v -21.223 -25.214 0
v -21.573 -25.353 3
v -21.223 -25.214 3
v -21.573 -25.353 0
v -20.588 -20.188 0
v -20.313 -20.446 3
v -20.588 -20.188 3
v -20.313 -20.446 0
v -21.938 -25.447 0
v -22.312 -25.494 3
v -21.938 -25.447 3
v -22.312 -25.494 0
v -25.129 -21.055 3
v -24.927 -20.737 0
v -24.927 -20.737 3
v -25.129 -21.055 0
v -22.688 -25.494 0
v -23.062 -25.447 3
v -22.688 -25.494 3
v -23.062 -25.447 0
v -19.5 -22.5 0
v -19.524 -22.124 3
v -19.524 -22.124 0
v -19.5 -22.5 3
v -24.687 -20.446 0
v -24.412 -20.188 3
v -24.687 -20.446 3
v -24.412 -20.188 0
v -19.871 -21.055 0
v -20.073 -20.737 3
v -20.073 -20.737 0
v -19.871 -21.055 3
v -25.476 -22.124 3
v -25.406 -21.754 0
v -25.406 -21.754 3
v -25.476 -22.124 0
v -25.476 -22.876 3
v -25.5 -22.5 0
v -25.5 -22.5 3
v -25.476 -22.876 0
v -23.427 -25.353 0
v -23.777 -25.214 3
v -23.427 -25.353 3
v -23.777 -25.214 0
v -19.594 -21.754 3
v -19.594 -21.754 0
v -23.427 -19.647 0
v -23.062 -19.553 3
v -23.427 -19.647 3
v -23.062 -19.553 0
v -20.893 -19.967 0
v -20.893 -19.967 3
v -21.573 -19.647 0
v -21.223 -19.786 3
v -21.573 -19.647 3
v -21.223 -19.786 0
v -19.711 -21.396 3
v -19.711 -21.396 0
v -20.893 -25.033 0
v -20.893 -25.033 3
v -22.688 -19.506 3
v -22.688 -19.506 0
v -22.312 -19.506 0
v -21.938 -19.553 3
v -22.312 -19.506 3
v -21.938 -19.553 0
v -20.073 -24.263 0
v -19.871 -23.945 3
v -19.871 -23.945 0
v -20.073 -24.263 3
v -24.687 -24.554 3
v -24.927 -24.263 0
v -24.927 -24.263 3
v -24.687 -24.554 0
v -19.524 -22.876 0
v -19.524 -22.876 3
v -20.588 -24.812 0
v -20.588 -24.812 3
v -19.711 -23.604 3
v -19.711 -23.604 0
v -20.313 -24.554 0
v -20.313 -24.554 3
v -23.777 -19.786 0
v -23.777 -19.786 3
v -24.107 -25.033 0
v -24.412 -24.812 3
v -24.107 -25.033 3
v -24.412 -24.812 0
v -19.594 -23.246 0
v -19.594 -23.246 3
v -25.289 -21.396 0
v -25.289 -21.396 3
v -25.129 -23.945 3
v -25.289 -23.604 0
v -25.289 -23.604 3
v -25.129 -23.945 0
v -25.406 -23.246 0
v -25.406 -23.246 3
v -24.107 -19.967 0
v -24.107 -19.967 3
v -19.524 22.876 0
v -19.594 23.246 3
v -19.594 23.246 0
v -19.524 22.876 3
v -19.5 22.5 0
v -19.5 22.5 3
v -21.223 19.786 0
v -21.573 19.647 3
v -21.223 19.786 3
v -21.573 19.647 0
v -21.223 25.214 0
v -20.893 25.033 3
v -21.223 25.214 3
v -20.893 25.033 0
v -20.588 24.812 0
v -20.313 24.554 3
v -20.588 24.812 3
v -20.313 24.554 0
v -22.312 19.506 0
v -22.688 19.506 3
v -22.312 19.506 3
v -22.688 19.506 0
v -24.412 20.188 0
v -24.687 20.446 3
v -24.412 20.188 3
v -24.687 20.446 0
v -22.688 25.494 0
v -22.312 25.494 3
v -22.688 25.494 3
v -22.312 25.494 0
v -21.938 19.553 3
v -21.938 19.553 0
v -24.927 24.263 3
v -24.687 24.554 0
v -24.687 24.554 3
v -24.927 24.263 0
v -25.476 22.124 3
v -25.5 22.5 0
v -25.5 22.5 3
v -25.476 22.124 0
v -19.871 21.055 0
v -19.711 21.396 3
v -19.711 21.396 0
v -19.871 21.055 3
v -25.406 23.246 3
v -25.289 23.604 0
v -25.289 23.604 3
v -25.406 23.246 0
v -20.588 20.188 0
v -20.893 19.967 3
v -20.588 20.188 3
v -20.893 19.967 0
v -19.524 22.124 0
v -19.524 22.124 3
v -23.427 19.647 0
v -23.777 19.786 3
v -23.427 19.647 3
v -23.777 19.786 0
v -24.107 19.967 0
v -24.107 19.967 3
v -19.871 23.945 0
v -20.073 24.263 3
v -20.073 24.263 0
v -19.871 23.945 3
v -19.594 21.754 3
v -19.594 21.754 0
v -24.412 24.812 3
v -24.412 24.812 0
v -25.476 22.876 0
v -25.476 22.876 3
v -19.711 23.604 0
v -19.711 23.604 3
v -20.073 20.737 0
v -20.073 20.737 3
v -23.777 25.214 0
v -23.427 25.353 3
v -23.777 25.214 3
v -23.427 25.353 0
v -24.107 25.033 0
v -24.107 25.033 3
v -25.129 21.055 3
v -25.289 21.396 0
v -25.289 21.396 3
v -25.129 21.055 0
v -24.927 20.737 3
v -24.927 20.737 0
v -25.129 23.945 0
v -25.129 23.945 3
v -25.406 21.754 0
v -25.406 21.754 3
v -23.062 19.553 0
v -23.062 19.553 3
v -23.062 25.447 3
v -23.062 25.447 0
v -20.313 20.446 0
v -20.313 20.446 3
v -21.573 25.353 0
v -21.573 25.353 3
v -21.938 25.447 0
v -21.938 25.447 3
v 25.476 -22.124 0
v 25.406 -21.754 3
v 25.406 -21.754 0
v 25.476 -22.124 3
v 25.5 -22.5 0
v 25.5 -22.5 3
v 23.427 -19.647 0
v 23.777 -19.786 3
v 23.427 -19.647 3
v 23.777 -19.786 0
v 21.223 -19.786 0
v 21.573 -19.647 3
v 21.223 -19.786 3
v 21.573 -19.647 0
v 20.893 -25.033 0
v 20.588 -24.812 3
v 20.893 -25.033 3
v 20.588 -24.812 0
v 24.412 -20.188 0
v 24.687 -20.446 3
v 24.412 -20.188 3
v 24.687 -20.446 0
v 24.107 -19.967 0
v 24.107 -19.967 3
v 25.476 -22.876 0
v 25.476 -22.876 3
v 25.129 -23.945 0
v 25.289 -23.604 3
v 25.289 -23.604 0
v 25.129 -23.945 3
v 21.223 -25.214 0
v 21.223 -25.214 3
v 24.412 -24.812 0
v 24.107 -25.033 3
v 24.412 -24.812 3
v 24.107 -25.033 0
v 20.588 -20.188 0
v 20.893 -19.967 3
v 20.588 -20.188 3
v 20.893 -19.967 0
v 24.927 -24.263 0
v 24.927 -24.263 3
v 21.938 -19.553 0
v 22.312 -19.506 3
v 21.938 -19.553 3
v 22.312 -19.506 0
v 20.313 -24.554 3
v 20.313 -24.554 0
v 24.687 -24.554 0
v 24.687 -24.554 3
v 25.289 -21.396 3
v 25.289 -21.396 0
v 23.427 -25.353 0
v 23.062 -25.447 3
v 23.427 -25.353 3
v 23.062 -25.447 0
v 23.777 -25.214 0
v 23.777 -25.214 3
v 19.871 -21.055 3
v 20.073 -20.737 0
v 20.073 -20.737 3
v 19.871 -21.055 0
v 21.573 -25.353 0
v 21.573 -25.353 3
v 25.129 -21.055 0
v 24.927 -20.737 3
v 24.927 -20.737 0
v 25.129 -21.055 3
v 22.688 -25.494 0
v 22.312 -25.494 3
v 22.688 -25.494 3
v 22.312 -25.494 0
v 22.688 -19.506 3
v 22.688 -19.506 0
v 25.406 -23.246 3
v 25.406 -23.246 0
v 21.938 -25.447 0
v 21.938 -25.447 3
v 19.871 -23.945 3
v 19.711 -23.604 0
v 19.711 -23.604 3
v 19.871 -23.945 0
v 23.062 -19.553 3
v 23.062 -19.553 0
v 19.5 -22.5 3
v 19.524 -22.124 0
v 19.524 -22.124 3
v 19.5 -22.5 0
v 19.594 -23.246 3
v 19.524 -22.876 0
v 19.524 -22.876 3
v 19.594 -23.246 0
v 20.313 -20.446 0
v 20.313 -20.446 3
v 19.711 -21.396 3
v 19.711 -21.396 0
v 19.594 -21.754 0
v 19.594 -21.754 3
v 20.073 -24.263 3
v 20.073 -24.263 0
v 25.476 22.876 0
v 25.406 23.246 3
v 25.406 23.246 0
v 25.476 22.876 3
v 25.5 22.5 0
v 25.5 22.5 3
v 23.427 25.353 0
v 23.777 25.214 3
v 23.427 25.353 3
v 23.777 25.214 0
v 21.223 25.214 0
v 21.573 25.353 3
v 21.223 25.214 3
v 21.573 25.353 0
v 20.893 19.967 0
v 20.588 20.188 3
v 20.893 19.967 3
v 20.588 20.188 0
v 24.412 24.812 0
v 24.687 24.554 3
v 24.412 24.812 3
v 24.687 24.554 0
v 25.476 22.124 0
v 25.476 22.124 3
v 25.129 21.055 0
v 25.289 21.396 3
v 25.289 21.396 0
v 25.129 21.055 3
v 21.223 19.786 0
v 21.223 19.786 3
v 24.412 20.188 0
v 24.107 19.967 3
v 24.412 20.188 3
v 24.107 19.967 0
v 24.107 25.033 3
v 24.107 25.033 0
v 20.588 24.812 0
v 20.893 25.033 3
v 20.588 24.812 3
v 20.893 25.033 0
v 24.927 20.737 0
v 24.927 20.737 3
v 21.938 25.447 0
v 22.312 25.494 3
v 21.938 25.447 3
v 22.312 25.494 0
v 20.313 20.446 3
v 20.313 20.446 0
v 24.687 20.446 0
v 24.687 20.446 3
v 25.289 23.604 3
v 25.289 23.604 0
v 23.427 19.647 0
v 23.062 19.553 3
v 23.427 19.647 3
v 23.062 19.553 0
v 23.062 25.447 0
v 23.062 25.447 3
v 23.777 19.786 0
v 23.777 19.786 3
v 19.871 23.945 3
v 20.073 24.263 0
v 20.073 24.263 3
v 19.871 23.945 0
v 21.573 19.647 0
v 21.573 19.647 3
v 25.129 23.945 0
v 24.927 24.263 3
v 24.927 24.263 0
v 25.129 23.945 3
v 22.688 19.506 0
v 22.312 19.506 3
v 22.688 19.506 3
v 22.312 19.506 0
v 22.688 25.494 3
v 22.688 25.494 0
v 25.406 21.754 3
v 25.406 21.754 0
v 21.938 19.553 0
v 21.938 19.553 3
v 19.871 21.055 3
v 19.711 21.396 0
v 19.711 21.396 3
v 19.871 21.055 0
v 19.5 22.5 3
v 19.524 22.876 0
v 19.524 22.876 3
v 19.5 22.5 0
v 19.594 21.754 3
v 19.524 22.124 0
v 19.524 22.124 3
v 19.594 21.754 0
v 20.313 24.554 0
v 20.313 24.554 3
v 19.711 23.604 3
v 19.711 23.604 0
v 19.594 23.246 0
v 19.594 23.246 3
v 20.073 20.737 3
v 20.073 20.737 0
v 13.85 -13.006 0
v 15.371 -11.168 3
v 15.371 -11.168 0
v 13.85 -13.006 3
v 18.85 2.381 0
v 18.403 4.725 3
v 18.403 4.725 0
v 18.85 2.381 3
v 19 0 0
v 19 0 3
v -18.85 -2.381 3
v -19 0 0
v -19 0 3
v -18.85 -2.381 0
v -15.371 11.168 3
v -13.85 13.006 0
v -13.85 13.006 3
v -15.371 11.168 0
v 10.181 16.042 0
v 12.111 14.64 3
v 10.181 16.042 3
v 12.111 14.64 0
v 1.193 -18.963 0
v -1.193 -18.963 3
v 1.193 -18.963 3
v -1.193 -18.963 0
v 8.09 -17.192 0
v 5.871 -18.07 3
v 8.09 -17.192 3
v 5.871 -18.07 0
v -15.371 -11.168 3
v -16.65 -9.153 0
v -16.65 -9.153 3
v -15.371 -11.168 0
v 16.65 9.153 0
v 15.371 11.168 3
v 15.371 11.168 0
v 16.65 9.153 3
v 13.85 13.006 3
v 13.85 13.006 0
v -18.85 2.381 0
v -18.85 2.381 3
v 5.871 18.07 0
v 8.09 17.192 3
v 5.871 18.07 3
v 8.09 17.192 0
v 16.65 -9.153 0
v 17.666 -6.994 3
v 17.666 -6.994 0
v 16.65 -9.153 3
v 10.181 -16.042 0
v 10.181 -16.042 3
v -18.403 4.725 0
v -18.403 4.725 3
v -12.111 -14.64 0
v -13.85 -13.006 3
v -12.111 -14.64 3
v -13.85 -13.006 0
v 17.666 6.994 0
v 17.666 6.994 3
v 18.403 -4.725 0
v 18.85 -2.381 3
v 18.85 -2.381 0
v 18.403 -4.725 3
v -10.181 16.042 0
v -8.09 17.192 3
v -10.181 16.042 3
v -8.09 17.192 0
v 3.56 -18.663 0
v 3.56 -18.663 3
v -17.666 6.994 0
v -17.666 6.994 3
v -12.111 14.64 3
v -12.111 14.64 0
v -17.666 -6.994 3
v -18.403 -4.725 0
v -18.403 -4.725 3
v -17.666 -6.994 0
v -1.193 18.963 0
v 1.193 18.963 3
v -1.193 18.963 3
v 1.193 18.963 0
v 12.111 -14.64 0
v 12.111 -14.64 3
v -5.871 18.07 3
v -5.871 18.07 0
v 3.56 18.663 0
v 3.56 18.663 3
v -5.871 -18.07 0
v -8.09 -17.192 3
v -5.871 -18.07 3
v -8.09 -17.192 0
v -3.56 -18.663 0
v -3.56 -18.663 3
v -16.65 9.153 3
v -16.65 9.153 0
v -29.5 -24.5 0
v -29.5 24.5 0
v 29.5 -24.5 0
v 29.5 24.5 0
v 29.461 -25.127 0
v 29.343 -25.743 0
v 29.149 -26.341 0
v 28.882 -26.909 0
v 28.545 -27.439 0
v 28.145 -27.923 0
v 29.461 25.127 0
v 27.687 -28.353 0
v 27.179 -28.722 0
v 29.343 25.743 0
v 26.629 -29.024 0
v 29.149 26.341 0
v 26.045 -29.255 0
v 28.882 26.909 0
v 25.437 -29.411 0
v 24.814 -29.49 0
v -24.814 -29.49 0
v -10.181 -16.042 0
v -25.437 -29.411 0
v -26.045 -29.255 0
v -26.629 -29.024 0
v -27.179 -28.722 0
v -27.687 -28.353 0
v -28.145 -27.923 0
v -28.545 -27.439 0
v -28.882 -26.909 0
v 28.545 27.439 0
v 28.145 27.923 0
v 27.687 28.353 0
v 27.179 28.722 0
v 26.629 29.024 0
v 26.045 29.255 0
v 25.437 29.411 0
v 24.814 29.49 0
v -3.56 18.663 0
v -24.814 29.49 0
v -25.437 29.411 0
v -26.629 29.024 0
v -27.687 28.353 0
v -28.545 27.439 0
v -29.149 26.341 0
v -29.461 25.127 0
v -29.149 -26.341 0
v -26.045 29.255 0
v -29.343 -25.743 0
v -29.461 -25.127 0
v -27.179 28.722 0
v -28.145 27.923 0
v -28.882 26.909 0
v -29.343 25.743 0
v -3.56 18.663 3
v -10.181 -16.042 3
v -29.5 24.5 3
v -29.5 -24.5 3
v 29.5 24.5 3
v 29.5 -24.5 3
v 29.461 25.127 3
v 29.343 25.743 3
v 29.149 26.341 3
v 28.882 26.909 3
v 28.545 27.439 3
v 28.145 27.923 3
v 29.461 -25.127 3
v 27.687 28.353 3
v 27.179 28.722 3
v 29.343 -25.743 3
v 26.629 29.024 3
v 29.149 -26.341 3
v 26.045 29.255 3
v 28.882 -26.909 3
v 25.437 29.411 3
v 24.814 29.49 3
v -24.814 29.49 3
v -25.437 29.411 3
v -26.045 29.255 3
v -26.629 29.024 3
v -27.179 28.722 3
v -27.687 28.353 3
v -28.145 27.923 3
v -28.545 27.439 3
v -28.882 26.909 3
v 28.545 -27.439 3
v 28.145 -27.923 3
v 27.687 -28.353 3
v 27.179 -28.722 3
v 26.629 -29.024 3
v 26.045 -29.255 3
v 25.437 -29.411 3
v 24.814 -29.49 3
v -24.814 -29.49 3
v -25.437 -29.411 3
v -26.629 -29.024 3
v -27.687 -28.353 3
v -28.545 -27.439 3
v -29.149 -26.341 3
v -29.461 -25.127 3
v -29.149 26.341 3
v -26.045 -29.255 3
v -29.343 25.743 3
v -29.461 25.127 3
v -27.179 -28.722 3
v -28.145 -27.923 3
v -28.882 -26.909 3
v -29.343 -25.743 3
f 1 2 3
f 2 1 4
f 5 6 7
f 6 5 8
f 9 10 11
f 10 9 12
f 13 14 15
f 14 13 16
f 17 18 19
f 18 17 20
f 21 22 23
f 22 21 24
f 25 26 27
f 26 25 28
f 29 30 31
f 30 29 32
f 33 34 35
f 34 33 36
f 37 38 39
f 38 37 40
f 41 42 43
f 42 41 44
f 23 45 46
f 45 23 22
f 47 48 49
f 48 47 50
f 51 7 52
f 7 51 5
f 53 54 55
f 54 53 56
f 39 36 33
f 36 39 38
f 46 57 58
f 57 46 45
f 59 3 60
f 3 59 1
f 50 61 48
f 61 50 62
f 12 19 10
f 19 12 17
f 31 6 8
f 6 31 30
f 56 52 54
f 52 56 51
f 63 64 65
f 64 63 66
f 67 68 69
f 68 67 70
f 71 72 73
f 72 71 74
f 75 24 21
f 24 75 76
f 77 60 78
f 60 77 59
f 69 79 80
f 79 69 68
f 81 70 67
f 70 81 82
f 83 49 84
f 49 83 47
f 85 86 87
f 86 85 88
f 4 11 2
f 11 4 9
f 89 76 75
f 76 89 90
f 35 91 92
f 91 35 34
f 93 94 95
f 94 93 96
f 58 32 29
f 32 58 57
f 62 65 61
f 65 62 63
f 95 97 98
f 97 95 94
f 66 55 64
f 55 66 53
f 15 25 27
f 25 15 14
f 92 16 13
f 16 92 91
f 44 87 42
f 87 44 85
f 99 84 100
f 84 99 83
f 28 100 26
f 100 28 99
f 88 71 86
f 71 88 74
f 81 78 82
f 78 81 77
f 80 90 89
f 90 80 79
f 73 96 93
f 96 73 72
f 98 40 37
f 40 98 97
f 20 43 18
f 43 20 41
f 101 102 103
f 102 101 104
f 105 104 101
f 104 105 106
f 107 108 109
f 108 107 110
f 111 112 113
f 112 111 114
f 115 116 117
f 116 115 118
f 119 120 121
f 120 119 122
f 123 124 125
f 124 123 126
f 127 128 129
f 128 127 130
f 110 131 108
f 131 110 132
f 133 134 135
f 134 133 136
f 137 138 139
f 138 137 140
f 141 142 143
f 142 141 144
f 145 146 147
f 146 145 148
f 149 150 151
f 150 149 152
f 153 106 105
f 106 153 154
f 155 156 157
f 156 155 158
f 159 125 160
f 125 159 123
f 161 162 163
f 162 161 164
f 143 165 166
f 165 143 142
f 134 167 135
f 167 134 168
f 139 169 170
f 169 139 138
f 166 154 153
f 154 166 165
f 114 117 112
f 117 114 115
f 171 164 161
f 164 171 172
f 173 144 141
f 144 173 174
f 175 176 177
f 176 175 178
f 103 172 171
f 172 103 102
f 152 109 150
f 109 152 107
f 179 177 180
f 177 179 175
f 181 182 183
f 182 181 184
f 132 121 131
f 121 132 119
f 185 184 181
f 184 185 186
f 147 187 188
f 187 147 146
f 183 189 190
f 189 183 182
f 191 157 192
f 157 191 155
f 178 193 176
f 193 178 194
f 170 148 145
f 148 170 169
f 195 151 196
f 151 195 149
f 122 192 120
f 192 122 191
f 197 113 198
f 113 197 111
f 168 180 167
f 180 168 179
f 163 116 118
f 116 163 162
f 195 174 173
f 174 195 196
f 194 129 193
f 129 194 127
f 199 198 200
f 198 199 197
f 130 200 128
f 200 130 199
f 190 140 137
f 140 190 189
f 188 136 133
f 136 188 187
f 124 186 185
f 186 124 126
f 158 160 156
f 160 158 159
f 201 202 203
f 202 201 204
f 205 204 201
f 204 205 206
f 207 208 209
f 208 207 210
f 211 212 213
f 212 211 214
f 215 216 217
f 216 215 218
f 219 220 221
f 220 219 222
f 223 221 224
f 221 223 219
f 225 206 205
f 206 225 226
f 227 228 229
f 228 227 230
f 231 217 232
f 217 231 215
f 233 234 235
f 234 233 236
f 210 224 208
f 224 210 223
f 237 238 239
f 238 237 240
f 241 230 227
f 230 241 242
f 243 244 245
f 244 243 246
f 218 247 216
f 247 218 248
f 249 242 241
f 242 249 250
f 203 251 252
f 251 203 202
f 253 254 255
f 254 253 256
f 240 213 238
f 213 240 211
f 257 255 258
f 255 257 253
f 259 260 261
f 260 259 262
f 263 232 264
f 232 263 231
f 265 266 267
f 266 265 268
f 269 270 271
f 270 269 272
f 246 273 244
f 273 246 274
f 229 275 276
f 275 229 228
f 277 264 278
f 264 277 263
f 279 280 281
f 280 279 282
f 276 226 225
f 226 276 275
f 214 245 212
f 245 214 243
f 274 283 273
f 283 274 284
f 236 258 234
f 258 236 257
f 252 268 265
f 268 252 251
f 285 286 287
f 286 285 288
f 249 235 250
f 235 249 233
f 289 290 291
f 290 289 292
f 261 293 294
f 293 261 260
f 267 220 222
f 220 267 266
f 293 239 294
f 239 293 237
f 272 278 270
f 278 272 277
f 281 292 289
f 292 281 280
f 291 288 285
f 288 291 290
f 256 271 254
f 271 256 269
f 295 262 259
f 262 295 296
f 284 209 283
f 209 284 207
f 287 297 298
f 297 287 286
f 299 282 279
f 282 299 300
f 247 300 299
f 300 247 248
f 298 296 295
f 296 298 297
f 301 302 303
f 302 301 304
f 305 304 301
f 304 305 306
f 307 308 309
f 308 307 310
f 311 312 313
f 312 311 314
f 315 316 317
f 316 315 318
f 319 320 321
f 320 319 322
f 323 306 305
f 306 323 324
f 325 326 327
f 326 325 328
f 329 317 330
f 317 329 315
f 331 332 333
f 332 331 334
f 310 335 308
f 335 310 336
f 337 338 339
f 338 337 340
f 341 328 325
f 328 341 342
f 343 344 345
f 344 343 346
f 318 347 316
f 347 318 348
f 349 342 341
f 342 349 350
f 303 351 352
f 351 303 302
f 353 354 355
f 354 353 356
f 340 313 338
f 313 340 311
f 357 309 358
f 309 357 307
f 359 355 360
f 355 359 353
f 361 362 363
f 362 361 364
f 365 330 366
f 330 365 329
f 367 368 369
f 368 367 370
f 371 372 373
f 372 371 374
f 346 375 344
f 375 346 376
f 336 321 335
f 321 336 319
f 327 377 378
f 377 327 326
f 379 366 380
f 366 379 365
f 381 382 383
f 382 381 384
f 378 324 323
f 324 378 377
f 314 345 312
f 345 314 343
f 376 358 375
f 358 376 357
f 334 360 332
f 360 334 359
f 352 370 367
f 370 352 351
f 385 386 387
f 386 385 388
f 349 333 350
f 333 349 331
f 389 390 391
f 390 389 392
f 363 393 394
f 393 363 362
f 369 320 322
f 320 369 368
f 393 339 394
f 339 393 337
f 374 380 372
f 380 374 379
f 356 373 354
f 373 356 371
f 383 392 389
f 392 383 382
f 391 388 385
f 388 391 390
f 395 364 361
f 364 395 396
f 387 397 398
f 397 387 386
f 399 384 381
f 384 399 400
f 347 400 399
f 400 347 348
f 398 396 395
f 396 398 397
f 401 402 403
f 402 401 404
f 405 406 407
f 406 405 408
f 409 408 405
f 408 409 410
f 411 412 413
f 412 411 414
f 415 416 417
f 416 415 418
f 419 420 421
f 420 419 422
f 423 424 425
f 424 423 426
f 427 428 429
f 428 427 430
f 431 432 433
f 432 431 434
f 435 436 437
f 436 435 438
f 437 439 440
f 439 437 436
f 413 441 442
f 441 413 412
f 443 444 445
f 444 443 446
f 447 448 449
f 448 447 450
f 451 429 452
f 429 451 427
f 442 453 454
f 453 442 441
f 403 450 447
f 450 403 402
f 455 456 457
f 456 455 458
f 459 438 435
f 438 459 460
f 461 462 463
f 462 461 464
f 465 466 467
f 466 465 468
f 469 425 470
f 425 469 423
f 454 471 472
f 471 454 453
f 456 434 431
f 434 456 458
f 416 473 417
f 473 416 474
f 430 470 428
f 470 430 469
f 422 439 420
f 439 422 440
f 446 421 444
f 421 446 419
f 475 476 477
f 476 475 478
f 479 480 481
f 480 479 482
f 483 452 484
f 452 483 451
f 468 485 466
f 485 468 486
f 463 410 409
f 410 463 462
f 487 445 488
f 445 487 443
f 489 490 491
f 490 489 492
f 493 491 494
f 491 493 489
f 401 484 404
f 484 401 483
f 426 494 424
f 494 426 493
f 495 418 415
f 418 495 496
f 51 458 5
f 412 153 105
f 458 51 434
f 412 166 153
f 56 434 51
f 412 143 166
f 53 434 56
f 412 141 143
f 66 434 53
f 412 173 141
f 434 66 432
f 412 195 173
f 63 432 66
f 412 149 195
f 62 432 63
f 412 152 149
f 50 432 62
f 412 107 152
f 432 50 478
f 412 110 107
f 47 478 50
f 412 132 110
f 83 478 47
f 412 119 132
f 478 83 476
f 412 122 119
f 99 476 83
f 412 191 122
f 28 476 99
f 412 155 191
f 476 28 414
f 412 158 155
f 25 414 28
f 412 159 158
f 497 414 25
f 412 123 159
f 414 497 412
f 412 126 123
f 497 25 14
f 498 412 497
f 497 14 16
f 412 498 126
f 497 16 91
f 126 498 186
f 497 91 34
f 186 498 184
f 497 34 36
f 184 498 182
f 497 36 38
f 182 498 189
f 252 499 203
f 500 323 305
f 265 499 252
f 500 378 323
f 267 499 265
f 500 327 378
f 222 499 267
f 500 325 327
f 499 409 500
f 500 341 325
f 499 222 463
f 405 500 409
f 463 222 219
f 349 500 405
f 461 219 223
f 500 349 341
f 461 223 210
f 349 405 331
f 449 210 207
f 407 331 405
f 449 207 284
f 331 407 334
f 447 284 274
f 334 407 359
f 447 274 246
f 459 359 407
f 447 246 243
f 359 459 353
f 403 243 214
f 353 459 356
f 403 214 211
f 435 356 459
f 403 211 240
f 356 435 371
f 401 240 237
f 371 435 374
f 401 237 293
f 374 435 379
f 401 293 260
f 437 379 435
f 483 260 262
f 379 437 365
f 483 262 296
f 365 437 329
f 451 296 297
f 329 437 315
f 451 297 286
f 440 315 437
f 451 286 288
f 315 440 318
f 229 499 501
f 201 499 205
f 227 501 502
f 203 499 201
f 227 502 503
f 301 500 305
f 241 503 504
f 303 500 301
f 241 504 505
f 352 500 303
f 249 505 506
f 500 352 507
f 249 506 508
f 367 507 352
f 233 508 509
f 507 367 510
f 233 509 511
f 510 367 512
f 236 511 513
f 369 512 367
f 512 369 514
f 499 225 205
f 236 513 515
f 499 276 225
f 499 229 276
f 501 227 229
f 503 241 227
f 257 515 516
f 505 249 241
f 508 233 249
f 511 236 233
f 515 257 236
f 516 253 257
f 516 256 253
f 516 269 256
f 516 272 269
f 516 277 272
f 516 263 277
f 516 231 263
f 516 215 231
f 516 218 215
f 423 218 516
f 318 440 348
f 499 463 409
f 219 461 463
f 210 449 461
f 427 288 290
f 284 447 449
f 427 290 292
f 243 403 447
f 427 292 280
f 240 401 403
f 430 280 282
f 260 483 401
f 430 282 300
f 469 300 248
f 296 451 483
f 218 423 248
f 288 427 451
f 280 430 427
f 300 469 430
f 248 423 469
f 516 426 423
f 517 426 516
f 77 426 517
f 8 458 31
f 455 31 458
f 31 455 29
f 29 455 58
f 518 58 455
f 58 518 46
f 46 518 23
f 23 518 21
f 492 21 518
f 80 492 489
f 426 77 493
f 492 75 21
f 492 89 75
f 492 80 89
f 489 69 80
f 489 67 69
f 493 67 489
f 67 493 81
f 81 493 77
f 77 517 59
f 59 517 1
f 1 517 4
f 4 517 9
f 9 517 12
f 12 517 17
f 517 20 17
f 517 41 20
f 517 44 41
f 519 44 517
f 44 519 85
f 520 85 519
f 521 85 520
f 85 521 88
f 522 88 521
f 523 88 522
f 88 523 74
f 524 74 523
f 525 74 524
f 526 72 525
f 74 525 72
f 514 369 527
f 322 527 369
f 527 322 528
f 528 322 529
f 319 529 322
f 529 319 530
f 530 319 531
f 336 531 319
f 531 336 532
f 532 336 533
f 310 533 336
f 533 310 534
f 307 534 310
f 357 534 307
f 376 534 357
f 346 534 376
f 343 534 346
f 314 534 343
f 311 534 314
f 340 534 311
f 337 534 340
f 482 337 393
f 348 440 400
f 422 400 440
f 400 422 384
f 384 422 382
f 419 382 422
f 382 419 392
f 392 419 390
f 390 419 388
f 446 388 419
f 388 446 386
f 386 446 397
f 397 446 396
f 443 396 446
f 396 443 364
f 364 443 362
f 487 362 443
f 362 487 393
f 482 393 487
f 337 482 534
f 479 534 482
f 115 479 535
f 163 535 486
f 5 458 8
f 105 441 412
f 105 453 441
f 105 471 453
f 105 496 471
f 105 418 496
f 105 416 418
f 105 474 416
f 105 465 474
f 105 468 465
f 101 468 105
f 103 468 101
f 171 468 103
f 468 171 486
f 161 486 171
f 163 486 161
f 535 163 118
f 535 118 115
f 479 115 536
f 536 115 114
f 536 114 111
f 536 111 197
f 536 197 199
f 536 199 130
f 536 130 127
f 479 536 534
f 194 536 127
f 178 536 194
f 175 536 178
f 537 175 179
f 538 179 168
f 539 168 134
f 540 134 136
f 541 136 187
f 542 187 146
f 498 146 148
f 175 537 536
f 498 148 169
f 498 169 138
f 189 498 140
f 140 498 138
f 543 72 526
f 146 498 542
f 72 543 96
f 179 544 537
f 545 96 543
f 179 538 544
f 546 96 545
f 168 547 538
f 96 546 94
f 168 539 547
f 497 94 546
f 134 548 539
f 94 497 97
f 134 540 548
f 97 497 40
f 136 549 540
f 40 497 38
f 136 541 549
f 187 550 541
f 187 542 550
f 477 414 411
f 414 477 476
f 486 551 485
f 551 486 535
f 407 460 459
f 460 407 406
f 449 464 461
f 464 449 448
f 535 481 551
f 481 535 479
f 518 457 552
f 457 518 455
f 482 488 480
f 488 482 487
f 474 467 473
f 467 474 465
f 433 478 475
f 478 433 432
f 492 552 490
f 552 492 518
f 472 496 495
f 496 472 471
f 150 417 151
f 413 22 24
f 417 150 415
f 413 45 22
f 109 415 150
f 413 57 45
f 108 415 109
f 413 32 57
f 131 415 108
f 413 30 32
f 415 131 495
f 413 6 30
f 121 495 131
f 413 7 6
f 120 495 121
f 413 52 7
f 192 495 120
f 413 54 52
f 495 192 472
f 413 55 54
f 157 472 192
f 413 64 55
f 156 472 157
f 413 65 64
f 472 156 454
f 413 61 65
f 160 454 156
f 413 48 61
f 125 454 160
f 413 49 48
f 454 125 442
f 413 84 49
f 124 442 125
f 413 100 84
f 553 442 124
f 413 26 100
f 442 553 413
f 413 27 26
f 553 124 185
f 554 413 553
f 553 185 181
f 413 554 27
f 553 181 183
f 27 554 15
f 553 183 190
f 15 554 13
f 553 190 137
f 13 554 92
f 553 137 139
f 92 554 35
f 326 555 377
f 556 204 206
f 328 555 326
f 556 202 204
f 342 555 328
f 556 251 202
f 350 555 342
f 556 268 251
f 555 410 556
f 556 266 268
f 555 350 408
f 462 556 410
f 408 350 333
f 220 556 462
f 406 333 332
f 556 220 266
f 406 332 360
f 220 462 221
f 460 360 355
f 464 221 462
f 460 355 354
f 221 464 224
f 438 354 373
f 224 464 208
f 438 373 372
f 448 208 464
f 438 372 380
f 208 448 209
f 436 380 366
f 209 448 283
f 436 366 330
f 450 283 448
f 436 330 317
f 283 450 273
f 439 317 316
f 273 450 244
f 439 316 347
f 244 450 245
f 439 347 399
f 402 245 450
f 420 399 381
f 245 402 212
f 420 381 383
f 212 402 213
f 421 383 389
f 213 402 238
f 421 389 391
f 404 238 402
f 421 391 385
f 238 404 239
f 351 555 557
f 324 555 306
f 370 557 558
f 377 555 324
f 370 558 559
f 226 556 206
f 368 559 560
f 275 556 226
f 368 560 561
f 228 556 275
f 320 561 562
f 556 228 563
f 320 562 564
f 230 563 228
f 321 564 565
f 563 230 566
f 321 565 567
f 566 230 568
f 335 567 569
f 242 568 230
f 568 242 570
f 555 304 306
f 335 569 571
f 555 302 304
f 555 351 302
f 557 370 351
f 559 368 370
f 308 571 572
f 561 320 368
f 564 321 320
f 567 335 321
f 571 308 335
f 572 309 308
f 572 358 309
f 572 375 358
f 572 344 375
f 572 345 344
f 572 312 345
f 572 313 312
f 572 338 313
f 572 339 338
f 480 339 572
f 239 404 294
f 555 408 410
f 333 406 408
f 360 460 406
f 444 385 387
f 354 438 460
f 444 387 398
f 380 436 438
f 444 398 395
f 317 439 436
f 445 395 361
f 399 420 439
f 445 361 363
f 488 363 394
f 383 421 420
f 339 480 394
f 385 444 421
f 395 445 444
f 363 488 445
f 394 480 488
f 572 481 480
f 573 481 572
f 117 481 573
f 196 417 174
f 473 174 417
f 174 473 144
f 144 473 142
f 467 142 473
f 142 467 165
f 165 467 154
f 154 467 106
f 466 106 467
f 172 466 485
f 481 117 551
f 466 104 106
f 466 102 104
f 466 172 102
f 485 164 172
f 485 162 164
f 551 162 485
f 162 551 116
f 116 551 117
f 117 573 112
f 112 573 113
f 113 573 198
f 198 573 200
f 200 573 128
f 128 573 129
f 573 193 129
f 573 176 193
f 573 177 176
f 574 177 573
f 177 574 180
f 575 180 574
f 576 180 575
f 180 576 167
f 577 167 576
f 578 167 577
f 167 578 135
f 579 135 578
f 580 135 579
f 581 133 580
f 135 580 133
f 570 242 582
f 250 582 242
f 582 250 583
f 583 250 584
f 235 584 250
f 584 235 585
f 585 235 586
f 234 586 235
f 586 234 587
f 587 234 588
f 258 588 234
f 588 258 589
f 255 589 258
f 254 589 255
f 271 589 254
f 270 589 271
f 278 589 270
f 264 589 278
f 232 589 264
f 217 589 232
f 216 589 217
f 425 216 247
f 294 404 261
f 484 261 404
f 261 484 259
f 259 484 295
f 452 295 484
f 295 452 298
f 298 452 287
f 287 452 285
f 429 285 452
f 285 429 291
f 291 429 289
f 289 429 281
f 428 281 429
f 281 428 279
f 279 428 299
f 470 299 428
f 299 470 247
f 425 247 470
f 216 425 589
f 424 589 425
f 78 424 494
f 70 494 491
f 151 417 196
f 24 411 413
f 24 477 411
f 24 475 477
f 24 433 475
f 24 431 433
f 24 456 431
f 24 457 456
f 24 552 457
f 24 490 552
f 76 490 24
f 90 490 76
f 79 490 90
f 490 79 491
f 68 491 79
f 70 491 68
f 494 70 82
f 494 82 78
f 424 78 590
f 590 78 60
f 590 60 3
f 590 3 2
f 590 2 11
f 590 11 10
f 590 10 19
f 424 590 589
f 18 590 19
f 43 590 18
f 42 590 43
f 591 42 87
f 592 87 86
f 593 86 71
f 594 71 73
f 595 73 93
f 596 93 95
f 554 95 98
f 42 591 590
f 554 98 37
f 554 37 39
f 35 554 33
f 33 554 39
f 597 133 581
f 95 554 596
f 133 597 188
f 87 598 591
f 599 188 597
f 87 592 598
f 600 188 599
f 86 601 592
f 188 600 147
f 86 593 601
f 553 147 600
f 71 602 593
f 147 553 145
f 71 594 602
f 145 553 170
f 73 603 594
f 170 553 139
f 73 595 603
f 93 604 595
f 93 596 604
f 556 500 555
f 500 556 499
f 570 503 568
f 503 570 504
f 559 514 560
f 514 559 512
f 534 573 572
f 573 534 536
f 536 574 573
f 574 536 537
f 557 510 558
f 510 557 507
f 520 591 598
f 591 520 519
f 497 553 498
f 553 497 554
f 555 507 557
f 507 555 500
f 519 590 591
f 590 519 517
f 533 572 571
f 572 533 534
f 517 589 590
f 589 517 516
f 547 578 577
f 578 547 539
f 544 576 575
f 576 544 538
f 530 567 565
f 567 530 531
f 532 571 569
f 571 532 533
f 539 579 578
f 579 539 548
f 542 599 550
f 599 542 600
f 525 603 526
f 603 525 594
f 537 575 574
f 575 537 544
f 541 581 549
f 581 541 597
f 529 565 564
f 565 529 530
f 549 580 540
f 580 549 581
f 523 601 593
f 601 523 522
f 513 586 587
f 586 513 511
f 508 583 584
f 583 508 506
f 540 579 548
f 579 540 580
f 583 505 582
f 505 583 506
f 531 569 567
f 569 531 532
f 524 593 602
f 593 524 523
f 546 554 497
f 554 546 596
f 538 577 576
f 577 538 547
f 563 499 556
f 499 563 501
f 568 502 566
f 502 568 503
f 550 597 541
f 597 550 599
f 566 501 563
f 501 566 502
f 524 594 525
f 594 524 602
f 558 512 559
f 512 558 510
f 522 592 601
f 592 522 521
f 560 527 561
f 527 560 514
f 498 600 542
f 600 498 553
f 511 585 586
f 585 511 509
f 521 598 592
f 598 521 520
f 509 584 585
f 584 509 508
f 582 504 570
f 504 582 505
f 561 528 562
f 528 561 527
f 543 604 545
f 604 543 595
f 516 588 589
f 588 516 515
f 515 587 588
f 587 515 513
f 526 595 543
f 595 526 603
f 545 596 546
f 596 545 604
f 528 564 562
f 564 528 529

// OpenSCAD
$fn = 50;


difference() {
	union() {
		hull() {
			translate(v = [-24.5000000000, 24.5000000000, 0]) {
				cylinder(h = 3, r = 5);
			}
			translate(v = [24.5000000000, 24.5000000000, 0]) {
				cylinder(h = 3, r = 5);
			}
			translate(v = [-24.5000000000, -24.5000000000, 0]) {
				cylinder(h = 3, r = 5);
			}
			translate(v = [24.5000000000, -24.5000000000, 0]) {
				cylinder(h = 3, r = 5);
			}
		}
	}
	union() {
		#translate(v = [-22.5000000000, -22.5000000000, -100.0000000000]) {
			cylinder(h = 200, r = 3.0000000000);
		}
		#translate(v = [-22.5000000000, 22.5000000000, -100.0000000000]) {
			cylinder(h = 200, r = 3.0000000000);
		}
		#translate(v = [22.5000000000, -22.5000000000, -100.0000000000]) {
			cylinder(h = 200, r = 3.0000000000);
		}
		#translate(v = [22.5000000000, 22.5000000000, -100.0000000000]) {
			cylinder(h = 200, r = 3.0000000000);
		}
		#cylinder(h = 3, r = 19.0000000000);
	}
}
